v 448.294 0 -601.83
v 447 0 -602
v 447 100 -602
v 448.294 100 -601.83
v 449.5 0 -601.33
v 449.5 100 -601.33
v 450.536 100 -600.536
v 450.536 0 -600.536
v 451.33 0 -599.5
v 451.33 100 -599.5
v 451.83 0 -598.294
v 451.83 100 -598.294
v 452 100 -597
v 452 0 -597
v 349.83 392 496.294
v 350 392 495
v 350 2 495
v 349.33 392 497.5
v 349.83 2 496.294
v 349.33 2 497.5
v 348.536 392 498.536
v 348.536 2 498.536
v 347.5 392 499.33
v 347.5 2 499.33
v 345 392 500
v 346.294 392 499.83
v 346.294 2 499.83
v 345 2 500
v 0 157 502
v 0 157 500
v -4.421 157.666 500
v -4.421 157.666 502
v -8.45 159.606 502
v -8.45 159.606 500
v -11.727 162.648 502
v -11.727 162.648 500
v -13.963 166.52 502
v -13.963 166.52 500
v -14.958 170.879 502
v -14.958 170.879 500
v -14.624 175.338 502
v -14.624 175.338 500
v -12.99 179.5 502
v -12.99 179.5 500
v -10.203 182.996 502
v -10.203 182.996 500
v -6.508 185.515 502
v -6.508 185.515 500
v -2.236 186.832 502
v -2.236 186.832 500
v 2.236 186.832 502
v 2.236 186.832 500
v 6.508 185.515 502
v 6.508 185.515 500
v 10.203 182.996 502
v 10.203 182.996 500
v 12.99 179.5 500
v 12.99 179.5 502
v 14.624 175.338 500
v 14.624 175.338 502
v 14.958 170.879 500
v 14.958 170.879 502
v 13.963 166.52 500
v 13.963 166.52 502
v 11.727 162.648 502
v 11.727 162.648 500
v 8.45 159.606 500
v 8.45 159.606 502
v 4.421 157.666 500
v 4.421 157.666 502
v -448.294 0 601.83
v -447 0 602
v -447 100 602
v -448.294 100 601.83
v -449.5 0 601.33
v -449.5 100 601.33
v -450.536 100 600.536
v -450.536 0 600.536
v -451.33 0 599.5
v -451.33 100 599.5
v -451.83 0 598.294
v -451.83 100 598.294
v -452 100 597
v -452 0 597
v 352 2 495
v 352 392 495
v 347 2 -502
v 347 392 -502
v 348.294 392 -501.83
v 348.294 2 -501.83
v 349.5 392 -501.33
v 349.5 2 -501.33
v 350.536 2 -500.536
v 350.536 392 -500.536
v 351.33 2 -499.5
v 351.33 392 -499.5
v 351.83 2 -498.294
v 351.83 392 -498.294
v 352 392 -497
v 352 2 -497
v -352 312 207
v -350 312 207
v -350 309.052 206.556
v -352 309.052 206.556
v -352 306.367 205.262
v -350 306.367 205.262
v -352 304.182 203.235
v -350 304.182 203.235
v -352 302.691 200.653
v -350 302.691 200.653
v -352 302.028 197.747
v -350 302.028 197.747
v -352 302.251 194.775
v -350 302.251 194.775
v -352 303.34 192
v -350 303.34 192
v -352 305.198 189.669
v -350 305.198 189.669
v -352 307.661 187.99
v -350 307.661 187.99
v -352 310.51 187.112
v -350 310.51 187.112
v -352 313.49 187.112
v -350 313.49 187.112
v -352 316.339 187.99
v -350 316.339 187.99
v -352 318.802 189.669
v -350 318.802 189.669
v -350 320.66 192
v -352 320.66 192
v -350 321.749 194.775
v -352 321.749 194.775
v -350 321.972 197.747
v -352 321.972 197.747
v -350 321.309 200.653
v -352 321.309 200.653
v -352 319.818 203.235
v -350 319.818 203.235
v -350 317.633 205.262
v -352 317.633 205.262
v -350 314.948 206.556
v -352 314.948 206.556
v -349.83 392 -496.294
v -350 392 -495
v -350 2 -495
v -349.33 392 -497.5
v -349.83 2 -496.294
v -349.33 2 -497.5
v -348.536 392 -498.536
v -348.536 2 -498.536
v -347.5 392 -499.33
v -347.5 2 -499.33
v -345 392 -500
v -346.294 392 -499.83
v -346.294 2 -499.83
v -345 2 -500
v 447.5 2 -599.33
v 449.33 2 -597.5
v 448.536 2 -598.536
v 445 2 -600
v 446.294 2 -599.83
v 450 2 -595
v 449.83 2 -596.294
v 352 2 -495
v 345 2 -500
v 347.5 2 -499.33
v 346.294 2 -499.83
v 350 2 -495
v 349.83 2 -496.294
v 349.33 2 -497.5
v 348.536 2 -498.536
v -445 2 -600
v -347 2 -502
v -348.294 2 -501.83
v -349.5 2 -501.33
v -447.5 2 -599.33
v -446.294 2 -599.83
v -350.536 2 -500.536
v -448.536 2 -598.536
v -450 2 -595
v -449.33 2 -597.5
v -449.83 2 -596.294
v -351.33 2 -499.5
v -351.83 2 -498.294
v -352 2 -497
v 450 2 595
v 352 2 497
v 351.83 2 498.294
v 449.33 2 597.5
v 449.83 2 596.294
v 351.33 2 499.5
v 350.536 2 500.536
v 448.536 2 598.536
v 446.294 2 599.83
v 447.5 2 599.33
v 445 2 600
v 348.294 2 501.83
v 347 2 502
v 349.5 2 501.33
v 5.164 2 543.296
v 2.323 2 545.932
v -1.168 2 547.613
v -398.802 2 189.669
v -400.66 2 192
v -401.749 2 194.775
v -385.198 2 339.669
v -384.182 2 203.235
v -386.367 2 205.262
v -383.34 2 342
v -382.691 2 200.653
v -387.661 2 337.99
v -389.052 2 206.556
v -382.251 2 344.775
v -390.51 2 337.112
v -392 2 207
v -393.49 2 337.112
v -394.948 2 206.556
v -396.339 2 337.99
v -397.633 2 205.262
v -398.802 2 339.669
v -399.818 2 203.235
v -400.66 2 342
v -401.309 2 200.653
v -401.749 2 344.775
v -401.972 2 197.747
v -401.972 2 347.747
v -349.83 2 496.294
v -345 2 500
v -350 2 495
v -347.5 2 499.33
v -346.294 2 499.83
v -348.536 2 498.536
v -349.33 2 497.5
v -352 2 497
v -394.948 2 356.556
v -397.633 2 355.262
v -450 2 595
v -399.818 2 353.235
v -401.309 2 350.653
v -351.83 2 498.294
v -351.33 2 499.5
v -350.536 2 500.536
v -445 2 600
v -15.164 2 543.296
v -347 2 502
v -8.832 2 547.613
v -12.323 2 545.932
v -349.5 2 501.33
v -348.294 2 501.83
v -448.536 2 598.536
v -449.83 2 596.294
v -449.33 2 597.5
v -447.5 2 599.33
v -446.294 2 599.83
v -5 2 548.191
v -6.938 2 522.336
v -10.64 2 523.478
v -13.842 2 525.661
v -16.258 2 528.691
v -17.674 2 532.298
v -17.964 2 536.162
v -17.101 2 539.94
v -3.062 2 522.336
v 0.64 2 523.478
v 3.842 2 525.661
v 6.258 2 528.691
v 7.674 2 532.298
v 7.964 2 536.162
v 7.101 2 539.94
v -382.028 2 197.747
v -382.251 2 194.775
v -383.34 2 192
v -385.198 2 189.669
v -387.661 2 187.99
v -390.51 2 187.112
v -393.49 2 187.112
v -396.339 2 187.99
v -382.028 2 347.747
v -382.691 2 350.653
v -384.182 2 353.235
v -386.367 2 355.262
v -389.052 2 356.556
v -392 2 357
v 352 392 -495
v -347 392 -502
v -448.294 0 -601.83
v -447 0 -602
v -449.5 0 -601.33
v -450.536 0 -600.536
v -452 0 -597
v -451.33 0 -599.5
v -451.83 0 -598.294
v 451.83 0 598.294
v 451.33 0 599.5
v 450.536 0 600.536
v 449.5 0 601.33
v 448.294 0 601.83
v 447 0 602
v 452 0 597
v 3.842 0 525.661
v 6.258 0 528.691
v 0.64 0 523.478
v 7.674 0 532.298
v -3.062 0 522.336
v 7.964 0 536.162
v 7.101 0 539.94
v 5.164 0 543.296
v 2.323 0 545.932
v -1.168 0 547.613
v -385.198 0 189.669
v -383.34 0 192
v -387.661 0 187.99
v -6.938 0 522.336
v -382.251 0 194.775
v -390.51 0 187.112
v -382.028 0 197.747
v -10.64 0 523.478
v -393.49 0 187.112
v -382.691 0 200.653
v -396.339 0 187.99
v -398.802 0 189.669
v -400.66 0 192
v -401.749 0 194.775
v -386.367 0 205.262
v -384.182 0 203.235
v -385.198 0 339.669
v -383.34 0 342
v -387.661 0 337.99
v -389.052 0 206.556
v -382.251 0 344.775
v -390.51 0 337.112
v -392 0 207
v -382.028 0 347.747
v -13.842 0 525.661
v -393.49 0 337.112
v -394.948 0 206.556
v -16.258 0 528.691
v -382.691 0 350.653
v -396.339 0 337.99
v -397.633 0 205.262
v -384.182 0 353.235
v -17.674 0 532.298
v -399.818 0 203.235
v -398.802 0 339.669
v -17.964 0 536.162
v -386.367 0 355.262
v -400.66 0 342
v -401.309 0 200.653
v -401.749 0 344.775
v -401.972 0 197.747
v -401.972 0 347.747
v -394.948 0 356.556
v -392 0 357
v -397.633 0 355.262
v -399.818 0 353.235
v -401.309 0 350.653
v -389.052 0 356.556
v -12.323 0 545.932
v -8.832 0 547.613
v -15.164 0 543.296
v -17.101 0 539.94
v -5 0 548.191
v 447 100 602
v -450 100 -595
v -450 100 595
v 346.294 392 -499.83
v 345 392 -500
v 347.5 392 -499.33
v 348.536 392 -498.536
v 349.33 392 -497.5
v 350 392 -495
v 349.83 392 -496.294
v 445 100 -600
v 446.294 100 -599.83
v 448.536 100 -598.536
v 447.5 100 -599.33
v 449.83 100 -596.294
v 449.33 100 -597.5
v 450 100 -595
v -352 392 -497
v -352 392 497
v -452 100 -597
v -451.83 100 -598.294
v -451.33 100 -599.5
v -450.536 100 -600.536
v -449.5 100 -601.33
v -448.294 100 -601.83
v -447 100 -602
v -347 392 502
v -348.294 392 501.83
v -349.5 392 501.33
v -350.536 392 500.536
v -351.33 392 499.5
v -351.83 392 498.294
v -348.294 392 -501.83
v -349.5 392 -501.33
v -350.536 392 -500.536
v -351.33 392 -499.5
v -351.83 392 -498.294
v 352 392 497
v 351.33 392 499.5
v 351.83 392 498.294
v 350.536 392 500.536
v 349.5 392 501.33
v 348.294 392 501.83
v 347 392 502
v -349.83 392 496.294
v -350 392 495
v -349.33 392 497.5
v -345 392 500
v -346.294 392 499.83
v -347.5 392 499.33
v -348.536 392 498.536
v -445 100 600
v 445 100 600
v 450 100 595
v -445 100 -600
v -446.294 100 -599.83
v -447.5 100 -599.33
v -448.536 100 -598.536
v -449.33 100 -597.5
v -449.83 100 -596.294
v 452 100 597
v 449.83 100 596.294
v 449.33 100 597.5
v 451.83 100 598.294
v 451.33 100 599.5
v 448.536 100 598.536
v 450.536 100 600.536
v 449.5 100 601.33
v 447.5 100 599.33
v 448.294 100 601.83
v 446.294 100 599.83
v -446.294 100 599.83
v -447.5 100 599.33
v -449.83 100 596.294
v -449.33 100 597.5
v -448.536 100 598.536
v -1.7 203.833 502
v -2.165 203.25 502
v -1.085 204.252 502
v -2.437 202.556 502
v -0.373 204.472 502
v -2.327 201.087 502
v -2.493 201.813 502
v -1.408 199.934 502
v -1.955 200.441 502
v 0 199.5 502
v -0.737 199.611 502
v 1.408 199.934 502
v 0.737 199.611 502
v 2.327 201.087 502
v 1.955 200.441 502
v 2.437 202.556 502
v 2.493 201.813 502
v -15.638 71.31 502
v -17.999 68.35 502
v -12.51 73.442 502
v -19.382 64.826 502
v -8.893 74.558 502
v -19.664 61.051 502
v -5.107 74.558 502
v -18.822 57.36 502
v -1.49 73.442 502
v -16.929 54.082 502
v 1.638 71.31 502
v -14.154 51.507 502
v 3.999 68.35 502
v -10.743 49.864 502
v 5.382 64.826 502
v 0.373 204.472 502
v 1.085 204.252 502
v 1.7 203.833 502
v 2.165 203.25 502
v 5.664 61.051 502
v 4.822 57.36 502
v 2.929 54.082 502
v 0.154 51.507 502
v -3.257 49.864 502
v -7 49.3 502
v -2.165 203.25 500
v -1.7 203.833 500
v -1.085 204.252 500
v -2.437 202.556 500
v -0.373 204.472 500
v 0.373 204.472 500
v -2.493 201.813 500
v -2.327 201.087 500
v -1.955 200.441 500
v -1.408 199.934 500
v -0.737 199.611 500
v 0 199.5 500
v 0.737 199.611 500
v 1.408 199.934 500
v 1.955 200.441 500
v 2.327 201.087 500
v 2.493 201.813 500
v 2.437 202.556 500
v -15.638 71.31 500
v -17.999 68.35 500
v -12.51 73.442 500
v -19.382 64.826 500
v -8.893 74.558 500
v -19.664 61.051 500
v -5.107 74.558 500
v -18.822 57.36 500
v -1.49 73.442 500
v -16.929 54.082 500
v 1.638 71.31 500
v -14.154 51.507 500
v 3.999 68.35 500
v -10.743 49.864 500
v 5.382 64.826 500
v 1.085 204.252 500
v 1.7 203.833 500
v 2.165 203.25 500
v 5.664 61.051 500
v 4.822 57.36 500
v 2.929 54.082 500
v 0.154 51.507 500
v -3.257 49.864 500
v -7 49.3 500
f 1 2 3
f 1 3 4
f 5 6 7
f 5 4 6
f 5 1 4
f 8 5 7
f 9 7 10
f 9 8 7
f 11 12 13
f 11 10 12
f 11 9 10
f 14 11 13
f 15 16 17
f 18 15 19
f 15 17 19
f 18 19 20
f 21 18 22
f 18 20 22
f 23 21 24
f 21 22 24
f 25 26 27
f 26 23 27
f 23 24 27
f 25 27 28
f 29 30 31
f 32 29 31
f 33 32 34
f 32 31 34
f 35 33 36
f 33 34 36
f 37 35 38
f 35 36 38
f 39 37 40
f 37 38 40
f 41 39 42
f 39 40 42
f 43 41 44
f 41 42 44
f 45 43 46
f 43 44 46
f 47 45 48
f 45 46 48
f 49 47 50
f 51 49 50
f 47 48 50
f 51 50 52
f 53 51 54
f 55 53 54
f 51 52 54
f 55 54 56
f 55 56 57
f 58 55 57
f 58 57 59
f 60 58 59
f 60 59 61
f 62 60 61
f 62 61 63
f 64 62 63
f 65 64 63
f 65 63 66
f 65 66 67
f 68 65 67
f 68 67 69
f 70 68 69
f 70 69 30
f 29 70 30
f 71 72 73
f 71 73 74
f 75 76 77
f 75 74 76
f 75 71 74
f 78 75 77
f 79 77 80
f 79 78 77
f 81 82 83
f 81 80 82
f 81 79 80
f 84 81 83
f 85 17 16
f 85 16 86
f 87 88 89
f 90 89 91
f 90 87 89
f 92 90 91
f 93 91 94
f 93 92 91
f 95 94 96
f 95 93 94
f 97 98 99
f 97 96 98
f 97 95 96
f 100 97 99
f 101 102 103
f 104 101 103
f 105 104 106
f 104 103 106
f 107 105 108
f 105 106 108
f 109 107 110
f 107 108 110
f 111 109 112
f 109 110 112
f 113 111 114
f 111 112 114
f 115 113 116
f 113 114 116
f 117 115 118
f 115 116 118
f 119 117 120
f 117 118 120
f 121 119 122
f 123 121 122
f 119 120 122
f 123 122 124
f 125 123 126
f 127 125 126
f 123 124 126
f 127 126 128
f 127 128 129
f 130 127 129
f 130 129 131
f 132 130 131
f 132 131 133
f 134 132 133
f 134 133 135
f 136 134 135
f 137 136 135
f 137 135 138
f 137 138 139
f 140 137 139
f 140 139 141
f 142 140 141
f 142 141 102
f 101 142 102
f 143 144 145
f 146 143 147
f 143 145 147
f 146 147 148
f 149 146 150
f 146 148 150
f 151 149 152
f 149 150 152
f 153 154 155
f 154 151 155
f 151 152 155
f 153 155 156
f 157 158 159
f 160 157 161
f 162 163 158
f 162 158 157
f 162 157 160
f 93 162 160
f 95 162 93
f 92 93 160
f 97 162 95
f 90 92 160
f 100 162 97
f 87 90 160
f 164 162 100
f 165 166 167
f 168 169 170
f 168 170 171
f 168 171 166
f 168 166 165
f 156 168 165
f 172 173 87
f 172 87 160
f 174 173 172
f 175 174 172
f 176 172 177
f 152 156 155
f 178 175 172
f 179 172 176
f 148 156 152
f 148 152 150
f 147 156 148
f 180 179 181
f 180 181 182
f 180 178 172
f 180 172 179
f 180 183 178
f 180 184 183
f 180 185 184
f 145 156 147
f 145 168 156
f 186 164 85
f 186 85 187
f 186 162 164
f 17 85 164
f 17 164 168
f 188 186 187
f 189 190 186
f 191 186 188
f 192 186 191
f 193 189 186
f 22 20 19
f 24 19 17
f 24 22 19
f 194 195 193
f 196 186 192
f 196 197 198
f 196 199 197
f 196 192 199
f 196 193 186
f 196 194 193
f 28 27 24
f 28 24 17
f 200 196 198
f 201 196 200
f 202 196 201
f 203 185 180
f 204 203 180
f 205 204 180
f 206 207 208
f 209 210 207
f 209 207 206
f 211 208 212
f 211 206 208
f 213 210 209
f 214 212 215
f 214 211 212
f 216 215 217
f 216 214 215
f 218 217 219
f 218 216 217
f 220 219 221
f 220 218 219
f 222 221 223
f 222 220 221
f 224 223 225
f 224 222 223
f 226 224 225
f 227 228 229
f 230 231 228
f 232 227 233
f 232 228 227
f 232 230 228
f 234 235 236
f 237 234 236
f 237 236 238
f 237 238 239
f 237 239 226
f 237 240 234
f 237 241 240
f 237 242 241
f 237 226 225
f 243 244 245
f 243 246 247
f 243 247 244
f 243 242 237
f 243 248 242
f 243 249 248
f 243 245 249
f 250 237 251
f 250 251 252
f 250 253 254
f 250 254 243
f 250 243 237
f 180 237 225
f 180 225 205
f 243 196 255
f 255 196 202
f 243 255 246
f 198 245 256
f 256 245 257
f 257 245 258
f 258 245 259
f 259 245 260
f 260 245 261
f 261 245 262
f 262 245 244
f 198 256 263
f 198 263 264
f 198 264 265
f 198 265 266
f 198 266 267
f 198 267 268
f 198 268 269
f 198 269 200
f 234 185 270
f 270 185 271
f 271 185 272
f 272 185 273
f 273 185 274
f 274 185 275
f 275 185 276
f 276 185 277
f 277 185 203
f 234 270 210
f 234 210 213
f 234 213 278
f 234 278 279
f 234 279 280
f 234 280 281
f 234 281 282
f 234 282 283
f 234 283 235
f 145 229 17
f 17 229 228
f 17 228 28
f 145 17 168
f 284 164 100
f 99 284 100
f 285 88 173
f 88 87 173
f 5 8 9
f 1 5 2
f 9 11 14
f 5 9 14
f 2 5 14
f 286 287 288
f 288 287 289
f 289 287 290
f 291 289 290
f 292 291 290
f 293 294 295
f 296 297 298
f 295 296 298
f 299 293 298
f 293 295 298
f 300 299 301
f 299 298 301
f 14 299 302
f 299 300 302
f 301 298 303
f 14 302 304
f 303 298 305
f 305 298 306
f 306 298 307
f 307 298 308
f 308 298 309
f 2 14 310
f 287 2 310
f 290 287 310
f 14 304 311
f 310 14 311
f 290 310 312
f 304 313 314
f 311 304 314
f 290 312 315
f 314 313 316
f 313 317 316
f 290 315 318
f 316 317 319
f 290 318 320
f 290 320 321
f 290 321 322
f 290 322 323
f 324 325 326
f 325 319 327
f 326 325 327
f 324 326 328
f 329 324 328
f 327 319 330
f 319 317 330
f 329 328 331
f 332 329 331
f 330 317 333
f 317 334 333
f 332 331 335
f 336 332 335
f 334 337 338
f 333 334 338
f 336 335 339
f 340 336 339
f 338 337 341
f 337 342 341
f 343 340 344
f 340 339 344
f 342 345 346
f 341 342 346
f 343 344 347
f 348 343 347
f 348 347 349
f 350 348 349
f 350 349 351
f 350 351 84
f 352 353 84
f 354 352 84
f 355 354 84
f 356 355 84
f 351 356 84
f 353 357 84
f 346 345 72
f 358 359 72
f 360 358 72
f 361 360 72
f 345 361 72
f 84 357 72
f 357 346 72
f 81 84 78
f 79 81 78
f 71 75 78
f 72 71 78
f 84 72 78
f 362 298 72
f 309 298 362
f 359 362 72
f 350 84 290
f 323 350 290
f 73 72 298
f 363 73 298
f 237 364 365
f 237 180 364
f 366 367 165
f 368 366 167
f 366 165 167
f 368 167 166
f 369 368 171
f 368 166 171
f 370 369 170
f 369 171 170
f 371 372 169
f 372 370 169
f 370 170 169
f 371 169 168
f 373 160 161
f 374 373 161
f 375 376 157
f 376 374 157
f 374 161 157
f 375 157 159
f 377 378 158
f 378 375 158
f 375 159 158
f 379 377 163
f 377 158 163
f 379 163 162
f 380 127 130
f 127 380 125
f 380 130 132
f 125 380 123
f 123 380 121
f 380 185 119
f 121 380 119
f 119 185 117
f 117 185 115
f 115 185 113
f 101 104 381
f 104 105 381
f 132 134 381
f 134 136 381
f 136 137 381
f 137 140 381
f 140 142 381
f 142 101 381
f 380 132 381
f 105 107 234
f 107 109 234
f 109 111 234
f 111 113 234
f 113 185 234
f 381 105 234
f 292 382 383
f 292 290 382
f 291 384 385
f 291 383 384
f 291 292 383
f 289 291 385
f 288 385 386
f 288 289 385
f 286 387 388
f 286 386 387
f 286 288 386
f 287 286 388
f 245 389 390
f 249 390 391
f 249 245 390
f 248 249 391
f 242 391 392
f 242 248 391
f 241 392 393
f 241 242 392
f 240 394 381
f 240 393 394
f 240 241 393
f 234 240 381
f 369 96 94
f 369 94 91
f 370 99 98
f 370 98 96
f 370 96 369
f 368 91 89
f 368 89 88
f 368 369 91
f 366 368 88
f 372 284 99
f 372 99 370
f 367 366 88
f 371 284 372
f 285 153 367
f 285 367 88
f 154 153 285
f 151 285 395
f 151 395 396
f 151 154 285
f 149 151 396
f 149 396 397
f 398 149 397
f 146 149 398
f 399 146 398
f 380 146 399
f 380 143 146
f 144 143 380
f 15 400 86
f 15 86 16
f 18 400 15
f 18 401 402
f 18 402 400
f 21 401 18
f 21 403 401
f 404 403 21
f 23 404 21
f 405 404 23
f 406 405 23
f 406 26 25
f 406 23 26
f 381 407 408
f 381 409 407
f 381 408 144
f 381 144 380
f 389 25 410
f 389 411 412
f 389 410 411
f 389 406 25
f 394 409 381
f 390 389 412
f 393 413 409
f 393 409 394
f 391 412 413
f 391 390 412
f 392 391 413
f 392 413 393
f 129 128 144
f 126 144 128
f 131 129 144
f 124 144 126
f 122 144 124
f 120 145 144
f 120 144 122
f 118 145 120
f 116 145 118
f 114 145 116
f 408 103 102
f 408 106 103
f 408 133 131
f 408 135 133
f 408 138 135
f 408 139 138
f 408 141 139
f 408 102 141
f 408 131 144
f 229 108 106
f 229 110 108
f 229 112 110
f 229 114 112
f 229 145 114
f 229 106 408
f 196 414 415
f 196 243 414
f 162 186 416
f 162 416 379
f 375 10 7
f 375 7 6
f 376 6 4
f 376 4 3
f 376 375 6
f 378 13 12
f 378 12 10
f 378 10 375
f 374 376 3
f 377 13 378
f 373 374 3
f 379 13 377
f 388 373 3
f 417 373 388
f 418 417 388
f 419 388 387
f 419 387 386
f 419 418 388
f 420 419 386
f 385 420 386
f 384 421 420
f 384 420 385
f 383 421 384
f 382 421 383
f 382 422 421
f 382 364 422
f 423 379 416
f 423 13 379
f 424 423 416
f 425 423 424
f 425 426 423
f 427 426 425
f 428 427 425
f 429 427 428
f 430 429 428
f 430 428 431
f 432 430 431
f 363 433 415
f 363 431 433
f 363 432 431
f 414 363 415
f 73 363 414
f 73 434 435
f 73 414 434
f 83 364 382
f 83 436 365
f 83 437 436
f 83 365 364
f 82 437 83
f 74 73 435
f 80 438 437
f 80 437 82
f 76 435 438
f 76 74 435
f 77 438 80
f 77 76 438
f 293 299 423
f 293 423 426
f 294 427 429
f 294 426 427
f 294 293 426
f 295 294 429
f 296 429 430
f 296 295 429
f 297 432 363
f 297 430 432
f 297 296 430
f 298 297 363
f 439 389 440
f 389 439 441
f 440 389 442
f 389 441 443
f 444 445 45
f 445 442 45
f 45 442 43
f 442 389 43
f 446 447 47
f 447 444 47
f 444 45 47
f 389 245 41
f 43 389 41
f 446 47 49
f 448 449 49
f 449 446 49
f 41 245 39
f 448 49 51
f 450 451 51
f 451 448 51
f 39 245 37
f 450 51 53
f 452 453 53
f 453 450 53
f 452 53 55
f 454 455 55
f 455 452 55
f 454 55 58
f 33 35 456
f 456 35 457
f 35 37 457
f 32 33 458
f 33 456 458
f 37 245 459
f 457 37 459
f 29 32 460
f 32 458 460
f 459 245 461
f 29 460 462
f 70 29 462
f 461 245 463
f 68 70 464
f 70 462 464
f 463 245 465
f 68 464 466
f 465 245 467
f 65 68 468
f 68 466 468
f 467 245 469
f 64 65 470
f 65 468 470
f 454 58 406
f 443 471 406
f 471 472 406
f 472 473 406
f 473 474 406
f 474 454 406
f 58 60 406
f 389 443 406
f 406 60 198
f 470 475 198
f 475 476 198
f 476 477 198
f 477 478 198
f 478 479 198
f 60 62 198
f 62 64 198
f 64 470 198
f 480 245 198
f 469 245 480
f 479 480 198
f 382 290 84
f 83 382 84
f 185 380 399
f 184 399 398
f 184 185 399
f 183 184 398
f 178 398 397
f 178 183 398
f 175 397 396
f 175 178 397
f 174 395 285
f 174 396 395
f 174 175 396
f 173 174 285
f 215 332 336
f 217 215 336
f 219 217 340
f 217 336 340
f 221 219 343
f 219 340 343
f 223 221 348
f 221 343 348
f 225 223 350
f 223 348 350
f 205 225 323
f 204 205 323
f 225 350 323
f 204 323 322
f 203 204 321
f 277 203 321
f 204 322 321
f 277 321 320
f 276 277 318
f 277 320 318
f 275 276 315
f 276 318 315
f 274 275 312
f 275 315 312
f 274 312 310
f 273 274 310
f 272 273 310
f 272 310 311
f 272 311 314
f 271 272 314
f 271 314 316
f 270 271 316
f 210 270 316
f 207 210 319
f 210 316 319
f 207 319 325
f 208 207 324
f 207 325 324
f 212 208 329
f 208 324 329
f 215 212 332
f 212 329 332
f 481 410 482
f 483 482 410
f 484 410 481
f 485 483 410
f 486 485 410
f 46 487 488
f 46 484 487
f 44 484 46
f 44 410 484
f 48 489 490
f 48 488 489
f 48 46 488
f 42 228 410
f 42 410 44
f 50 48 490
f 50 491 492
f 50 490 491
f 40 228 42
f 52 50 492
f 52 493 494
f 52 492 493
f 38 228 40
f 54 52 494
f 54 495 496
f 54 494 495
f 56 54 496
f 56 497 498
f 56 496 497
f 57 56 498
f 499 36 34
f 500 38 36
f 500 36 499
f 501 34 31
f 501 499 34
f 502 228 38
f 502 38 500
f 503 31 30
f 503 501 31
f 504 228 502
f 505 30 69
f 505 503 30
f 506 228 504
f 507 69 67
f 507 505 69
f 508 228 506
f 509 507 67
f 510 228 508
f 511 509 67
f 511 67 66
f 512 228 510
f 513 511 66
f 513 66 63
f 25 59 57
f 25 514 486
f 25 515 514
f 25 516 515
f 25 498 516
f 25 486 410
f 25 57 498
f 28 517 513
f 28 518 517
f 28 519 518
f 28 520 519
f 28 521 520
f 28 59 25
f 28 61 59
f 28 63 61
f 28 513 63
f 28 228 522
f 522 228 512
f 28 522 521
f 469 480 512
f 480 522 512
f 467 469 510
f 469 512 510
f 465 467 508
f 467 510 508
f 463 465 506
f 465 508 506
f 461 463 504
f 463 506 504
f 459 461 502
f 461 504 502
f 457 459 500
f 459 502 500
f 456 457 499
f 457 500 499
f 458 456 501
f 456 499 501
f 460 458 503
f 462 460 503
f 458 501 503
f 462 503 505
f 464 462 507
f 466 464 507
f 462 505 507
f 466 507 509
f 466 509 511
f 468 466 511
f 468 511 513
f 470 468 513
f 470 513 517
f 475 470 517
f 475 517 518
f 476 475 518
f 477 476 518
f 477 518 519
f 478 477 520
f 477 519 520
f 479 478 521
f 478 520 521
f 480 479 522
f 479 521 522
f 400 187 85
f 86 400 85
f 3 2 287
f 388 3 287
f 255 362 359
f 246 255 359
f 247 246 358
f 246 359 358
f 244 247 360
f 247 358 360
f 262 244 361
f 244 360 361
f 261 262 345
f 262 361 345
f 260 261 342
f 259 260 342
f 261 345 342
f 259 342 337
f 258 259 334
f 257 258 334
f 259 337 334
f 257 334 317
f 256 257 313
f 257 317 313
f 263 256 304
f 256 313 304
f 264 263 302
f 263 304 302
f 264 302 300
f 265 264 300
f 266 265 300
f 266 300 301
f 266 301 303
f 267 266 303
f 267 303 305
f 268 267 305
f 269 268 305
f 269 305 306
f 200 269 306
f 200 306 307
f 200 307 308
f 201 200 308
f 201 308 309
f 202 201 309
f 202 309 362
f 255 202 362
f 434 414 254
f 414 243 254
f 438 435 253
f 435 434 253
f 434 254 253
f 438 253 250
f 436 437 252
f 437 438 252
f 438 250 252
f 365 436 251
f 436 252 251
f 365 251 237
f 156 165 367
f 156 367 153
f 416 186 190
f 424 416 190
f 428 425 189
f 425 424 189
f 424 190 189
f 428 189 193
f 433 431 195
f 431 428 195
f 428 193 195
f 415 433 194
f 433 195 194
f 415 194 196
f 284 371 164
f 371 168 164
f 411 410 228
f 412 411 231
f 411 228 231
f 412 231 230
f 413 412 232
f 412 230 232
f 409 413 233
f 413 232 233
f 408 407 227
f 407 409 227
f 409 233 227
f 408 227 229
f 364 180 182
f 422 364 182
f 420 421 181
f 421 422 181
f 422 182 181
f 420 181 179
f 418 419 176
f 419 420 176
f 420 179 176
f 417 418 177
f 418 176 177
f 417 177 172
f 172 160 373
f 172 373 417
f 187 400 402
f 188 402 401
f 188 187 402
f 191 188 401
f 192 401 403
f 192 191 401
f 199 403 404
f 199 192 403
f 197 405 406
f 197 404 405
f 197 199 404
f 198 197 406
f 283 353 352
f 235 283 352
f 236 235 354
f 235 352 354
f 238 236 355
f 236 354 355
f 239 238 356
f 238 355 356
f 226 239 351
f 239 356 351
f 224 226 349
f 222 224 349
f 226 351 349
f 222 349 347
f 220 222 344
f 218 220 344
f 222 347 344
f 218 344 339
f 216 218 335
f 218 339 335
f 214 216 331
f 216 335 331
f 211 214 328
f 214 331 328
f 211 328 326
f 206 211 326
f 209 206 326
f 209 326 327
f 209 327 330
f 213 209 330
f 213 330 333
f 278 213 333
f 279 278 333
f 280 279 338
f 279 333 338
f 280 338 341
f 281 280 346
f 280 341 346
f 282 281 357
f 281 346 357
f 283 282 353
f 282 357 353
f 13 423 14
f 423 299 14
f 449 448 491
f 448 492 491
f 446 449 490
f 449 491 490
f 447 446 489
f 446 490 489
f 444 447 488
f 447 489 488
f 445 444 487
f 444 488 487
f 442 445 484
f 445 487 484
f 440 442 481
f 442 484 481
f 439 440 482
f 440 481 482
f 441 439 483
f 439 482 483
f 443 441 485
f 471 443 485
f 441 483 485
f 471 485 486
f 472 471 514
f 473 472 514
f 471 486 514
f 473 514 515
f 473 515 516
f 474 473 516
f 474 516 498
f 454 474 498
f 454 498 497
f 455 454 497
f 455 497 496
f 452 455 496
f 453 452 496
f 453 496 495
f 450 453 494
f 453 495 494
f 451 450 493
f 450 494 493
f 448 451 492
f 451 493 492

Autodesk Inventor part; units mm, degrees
ref_plane "YZ Plane" through (0, 0, 0) normal (1, 0, 0) x (0, 1, 0)
ref_plane "XZ Plane" through (0, 0, 0) normal (0, 1, 0) x (-1, 0, 0)
ref_plane "XY Plane" through (0, 0, 0) normal (0, 0, 1) x (1, 0, 0)
sketch "Sketch1" plane through (0, 0, 0) normal (0, 1, 0) x (-1, 0, 0)
  line L0 (345, 500) -> (-345, 500)
  line L1 (-345, -500) -> (345, -500)
  line L2 (350, -495) -> (350, 495)
  line L3 (350, 500) -> (-350, -500) construction
  line L4 (-350, 500) -> (350, -500) construction
  line L5 (347, 502) -> (-347, 502)
  line L6 (-347, -502) -> (347, -502)
  line L7 (352, -497) -> (352, 497)
  line L8 (352, 502) -> (-352, -502) construction
  line L9 (-352, 502) -> (352, -502) construction
  line L10 (445, 600) -> (-445, 600)
  line L11 (-450, 595) -> (-450, -595)
  line L12 (-445, -600) -> (445, -600)
  line L13 (450, -595) -> (450, 595)
  line L14 (450, 600) -> (-450, -600) construction
  line L15 (-450, 600) -> (450, -600) construction
  line L16 (447, 602) -> (-447, 602)
  line L17 (-452, 597) -> (-452, -597)
  line L18 (-447, -602) -> (447, -602)
  line L19 (452, -597) -> (452, 597)
  line L20 (452, 602) -> (-452, -602) construction
  line L21 (-452, 602) -> (452, -602) construction
  arc A0 (452, 597) -> (447, 602) centre (447, 597) ccw
  arc A1 (450, 595) -> (445, 600) centre (445, 595) ccw
  arc A2 (-445, 600) -> (-450, 595) centre (-445, 595) ccw
  arc A3 (-447, 602) -> (-452, 597) centre (-447, 597) ccw
  arc A4 (-450, -595) -> (-445, -600) centre (-445, -595) ccw
  arc A5 (-452, -597) -> (-447, -602) centre (-447, -597) ccw
  arc A6 (445, -600) -> (450, -595) centre (445, -595) ccw
  arc A7 (447, -602) -> (452, -597) centre (447, -597) ccw
  arc A8 (350, 495) -> (345, 500) centre (345, 495) ccw
  arc A9 (352, 497) -> (347, 502) centre (347, 497) ccw
  arc A10 (-345, 500) -> (-350, 495) centre (-345, 495) ccw
  arc A11 (-347, 502) -> (-352, 497) centre (-347, 497) ccw
  arc A12 (-352, -497) -> (-347, -502) centre (-347, -497) ccw
  arc A13 (-350, -495) -> (-345, -500) centre (-345, -495) ccw
  arc A14 (345, -500) -> (350, -495) centre (345, -495) ccw
  arc A15 (347, -502) -> (352, -497) centre (347, -497) ccw
  line L22 (-350, 495) -> (-352, 495)
  line L23 (-350, -495) -> (-352, -495)
  line L24 (-352, 497) -> (-352, 495)
  line L25 (-350, 466.6667) -> (-350, 466.1504)
  line L26 (-352, 469.3333) -> (-352, 468.8142)
  line L27 (-352, -495) -> (-352, -497)
  point P0 (0, 0)
  dimension "d0" = 700
  dimension "d1" = 1000
  dimension "d2" = 704
  dimension "d3" = 1004
  dimension "d4" = 900
  dimension "d5" = 1200
  dimension "d6" = 904
  dimension "d7" = 1204
  dimension "d8" = 5
  dimension "d9" = 5
extrude "Extrusion6" add sketch "Sketch1" along normal blind 2 contours A1 L13 A6 L12 A4 L11 A2 L10
extrude "Extrusion7" add sketch "Sketch1" along normal blind 392 contours L0 A10 L22 L24 A11 L5 A9 L7 A15 L6 A12 L27 L23 A13 L1 A14 L2 A8
extrude "Extrusion8" add sketch "Sketch1" along normal blind 100 contours A0 L19 A7 L18 A5 L17 A3 L16
sketch "Sketch2" plane through (-347, 2, 502) normal (0, 0, 1) x (1, 0, 0)
  line L0 (694, 0) -> (694, 390) projected
  line L1 (0, 390) -> (694, 390) projected
  point P0 (347, -2)
  point P1 (347, 200)
  dimension "d40" = 347
  dimension "d42" = 190
hole "Hole1" at (0, 202, 502) direction (0, 0, -1) diameter 5 depth 3 tip angle 118
sketch "Sketch3" plane through (-347, 2, 502) normal (0, 0, 1) x (1, 0, 0)
  line L0 (694, 0) -> (694, 390) projected
  line L1 (0, 390) -> (694, 390) projected
  point P0 (347, -2)
  point P1 (347, 170)
  dimension "d41" = 347
  dimension "d43" = 220
hole "Hole2" at (0, 172, 502) direction (0, 0, -1) diameter 30 depth 3 tip angle 118
sketch "Sketch4" plane through (-352, 2, 497) normal (-1, 0, 0) x (0, 0, 1)
  line L0 (0, 0) -> (0, 390) projected
  line L1 (-994, 390) -> (0, 390) projected
  point P0 (-497, -2)
  point P1 (-150, -20)
  point P2 (-300, 310)
  dimension "d58" = 300
  dimension "d59" = 150
  dimension "d60" = 80
  dimension "d61" = 410
hole "Hole3" at (-352, -18, 347) at (-352, 312, 197) direction (1, 0, 0) diameter 20 depth 20
sketch "Sketch5" plane through (0, 2, 0) normal (0, 1, 0) x (1, 0, 0)
  line L0 (-352, -497) -> (-352, 497) projected
  point P0 (0, 0)
  point P1 (-392, -347)
  point P2 (-392, -197)
  dimension "d62" = 150
  dimension "d63" = 40
  dimension "d64" = 300
  dimension "d65" = 40
hole "Hole4" at (-392, 2, 347) at (-392, 2, 197) direction (0, -1, 0) diameter 20 depth 20
sketch "Sketch6" plane through (-347, 2, 502) normal (0, 0, 1) x (1, 0, 0)
  line L0 (694, 0) -> (0, 0) projected
  line L1 (0, 0) -> (0, 390) projected
  point P0 (347, -2)
  point P1 (340, 60)
  dimension "d73" = 60
  dimension "d74" = 340
hole "Hole5" at (-7, 62, 502) direction (0, 0, -1) diameter 25.4 depth 25.4 tip angle 118
sketch "Sketch7" plane through (0, 2, 0) normal (0, 1, 0) x (1, 0, 0)
  point P0 (0, 0)
  point P1 (-5, -535.191)
  point P2 (-345, -500)
  dimension "d82" = 340
hole "Hole6" at (-5, 2, 535.191) direction (0, -1, 0) diameter 26 depth 26 tip angle 118
properties part number "tub" material "CFRP"
